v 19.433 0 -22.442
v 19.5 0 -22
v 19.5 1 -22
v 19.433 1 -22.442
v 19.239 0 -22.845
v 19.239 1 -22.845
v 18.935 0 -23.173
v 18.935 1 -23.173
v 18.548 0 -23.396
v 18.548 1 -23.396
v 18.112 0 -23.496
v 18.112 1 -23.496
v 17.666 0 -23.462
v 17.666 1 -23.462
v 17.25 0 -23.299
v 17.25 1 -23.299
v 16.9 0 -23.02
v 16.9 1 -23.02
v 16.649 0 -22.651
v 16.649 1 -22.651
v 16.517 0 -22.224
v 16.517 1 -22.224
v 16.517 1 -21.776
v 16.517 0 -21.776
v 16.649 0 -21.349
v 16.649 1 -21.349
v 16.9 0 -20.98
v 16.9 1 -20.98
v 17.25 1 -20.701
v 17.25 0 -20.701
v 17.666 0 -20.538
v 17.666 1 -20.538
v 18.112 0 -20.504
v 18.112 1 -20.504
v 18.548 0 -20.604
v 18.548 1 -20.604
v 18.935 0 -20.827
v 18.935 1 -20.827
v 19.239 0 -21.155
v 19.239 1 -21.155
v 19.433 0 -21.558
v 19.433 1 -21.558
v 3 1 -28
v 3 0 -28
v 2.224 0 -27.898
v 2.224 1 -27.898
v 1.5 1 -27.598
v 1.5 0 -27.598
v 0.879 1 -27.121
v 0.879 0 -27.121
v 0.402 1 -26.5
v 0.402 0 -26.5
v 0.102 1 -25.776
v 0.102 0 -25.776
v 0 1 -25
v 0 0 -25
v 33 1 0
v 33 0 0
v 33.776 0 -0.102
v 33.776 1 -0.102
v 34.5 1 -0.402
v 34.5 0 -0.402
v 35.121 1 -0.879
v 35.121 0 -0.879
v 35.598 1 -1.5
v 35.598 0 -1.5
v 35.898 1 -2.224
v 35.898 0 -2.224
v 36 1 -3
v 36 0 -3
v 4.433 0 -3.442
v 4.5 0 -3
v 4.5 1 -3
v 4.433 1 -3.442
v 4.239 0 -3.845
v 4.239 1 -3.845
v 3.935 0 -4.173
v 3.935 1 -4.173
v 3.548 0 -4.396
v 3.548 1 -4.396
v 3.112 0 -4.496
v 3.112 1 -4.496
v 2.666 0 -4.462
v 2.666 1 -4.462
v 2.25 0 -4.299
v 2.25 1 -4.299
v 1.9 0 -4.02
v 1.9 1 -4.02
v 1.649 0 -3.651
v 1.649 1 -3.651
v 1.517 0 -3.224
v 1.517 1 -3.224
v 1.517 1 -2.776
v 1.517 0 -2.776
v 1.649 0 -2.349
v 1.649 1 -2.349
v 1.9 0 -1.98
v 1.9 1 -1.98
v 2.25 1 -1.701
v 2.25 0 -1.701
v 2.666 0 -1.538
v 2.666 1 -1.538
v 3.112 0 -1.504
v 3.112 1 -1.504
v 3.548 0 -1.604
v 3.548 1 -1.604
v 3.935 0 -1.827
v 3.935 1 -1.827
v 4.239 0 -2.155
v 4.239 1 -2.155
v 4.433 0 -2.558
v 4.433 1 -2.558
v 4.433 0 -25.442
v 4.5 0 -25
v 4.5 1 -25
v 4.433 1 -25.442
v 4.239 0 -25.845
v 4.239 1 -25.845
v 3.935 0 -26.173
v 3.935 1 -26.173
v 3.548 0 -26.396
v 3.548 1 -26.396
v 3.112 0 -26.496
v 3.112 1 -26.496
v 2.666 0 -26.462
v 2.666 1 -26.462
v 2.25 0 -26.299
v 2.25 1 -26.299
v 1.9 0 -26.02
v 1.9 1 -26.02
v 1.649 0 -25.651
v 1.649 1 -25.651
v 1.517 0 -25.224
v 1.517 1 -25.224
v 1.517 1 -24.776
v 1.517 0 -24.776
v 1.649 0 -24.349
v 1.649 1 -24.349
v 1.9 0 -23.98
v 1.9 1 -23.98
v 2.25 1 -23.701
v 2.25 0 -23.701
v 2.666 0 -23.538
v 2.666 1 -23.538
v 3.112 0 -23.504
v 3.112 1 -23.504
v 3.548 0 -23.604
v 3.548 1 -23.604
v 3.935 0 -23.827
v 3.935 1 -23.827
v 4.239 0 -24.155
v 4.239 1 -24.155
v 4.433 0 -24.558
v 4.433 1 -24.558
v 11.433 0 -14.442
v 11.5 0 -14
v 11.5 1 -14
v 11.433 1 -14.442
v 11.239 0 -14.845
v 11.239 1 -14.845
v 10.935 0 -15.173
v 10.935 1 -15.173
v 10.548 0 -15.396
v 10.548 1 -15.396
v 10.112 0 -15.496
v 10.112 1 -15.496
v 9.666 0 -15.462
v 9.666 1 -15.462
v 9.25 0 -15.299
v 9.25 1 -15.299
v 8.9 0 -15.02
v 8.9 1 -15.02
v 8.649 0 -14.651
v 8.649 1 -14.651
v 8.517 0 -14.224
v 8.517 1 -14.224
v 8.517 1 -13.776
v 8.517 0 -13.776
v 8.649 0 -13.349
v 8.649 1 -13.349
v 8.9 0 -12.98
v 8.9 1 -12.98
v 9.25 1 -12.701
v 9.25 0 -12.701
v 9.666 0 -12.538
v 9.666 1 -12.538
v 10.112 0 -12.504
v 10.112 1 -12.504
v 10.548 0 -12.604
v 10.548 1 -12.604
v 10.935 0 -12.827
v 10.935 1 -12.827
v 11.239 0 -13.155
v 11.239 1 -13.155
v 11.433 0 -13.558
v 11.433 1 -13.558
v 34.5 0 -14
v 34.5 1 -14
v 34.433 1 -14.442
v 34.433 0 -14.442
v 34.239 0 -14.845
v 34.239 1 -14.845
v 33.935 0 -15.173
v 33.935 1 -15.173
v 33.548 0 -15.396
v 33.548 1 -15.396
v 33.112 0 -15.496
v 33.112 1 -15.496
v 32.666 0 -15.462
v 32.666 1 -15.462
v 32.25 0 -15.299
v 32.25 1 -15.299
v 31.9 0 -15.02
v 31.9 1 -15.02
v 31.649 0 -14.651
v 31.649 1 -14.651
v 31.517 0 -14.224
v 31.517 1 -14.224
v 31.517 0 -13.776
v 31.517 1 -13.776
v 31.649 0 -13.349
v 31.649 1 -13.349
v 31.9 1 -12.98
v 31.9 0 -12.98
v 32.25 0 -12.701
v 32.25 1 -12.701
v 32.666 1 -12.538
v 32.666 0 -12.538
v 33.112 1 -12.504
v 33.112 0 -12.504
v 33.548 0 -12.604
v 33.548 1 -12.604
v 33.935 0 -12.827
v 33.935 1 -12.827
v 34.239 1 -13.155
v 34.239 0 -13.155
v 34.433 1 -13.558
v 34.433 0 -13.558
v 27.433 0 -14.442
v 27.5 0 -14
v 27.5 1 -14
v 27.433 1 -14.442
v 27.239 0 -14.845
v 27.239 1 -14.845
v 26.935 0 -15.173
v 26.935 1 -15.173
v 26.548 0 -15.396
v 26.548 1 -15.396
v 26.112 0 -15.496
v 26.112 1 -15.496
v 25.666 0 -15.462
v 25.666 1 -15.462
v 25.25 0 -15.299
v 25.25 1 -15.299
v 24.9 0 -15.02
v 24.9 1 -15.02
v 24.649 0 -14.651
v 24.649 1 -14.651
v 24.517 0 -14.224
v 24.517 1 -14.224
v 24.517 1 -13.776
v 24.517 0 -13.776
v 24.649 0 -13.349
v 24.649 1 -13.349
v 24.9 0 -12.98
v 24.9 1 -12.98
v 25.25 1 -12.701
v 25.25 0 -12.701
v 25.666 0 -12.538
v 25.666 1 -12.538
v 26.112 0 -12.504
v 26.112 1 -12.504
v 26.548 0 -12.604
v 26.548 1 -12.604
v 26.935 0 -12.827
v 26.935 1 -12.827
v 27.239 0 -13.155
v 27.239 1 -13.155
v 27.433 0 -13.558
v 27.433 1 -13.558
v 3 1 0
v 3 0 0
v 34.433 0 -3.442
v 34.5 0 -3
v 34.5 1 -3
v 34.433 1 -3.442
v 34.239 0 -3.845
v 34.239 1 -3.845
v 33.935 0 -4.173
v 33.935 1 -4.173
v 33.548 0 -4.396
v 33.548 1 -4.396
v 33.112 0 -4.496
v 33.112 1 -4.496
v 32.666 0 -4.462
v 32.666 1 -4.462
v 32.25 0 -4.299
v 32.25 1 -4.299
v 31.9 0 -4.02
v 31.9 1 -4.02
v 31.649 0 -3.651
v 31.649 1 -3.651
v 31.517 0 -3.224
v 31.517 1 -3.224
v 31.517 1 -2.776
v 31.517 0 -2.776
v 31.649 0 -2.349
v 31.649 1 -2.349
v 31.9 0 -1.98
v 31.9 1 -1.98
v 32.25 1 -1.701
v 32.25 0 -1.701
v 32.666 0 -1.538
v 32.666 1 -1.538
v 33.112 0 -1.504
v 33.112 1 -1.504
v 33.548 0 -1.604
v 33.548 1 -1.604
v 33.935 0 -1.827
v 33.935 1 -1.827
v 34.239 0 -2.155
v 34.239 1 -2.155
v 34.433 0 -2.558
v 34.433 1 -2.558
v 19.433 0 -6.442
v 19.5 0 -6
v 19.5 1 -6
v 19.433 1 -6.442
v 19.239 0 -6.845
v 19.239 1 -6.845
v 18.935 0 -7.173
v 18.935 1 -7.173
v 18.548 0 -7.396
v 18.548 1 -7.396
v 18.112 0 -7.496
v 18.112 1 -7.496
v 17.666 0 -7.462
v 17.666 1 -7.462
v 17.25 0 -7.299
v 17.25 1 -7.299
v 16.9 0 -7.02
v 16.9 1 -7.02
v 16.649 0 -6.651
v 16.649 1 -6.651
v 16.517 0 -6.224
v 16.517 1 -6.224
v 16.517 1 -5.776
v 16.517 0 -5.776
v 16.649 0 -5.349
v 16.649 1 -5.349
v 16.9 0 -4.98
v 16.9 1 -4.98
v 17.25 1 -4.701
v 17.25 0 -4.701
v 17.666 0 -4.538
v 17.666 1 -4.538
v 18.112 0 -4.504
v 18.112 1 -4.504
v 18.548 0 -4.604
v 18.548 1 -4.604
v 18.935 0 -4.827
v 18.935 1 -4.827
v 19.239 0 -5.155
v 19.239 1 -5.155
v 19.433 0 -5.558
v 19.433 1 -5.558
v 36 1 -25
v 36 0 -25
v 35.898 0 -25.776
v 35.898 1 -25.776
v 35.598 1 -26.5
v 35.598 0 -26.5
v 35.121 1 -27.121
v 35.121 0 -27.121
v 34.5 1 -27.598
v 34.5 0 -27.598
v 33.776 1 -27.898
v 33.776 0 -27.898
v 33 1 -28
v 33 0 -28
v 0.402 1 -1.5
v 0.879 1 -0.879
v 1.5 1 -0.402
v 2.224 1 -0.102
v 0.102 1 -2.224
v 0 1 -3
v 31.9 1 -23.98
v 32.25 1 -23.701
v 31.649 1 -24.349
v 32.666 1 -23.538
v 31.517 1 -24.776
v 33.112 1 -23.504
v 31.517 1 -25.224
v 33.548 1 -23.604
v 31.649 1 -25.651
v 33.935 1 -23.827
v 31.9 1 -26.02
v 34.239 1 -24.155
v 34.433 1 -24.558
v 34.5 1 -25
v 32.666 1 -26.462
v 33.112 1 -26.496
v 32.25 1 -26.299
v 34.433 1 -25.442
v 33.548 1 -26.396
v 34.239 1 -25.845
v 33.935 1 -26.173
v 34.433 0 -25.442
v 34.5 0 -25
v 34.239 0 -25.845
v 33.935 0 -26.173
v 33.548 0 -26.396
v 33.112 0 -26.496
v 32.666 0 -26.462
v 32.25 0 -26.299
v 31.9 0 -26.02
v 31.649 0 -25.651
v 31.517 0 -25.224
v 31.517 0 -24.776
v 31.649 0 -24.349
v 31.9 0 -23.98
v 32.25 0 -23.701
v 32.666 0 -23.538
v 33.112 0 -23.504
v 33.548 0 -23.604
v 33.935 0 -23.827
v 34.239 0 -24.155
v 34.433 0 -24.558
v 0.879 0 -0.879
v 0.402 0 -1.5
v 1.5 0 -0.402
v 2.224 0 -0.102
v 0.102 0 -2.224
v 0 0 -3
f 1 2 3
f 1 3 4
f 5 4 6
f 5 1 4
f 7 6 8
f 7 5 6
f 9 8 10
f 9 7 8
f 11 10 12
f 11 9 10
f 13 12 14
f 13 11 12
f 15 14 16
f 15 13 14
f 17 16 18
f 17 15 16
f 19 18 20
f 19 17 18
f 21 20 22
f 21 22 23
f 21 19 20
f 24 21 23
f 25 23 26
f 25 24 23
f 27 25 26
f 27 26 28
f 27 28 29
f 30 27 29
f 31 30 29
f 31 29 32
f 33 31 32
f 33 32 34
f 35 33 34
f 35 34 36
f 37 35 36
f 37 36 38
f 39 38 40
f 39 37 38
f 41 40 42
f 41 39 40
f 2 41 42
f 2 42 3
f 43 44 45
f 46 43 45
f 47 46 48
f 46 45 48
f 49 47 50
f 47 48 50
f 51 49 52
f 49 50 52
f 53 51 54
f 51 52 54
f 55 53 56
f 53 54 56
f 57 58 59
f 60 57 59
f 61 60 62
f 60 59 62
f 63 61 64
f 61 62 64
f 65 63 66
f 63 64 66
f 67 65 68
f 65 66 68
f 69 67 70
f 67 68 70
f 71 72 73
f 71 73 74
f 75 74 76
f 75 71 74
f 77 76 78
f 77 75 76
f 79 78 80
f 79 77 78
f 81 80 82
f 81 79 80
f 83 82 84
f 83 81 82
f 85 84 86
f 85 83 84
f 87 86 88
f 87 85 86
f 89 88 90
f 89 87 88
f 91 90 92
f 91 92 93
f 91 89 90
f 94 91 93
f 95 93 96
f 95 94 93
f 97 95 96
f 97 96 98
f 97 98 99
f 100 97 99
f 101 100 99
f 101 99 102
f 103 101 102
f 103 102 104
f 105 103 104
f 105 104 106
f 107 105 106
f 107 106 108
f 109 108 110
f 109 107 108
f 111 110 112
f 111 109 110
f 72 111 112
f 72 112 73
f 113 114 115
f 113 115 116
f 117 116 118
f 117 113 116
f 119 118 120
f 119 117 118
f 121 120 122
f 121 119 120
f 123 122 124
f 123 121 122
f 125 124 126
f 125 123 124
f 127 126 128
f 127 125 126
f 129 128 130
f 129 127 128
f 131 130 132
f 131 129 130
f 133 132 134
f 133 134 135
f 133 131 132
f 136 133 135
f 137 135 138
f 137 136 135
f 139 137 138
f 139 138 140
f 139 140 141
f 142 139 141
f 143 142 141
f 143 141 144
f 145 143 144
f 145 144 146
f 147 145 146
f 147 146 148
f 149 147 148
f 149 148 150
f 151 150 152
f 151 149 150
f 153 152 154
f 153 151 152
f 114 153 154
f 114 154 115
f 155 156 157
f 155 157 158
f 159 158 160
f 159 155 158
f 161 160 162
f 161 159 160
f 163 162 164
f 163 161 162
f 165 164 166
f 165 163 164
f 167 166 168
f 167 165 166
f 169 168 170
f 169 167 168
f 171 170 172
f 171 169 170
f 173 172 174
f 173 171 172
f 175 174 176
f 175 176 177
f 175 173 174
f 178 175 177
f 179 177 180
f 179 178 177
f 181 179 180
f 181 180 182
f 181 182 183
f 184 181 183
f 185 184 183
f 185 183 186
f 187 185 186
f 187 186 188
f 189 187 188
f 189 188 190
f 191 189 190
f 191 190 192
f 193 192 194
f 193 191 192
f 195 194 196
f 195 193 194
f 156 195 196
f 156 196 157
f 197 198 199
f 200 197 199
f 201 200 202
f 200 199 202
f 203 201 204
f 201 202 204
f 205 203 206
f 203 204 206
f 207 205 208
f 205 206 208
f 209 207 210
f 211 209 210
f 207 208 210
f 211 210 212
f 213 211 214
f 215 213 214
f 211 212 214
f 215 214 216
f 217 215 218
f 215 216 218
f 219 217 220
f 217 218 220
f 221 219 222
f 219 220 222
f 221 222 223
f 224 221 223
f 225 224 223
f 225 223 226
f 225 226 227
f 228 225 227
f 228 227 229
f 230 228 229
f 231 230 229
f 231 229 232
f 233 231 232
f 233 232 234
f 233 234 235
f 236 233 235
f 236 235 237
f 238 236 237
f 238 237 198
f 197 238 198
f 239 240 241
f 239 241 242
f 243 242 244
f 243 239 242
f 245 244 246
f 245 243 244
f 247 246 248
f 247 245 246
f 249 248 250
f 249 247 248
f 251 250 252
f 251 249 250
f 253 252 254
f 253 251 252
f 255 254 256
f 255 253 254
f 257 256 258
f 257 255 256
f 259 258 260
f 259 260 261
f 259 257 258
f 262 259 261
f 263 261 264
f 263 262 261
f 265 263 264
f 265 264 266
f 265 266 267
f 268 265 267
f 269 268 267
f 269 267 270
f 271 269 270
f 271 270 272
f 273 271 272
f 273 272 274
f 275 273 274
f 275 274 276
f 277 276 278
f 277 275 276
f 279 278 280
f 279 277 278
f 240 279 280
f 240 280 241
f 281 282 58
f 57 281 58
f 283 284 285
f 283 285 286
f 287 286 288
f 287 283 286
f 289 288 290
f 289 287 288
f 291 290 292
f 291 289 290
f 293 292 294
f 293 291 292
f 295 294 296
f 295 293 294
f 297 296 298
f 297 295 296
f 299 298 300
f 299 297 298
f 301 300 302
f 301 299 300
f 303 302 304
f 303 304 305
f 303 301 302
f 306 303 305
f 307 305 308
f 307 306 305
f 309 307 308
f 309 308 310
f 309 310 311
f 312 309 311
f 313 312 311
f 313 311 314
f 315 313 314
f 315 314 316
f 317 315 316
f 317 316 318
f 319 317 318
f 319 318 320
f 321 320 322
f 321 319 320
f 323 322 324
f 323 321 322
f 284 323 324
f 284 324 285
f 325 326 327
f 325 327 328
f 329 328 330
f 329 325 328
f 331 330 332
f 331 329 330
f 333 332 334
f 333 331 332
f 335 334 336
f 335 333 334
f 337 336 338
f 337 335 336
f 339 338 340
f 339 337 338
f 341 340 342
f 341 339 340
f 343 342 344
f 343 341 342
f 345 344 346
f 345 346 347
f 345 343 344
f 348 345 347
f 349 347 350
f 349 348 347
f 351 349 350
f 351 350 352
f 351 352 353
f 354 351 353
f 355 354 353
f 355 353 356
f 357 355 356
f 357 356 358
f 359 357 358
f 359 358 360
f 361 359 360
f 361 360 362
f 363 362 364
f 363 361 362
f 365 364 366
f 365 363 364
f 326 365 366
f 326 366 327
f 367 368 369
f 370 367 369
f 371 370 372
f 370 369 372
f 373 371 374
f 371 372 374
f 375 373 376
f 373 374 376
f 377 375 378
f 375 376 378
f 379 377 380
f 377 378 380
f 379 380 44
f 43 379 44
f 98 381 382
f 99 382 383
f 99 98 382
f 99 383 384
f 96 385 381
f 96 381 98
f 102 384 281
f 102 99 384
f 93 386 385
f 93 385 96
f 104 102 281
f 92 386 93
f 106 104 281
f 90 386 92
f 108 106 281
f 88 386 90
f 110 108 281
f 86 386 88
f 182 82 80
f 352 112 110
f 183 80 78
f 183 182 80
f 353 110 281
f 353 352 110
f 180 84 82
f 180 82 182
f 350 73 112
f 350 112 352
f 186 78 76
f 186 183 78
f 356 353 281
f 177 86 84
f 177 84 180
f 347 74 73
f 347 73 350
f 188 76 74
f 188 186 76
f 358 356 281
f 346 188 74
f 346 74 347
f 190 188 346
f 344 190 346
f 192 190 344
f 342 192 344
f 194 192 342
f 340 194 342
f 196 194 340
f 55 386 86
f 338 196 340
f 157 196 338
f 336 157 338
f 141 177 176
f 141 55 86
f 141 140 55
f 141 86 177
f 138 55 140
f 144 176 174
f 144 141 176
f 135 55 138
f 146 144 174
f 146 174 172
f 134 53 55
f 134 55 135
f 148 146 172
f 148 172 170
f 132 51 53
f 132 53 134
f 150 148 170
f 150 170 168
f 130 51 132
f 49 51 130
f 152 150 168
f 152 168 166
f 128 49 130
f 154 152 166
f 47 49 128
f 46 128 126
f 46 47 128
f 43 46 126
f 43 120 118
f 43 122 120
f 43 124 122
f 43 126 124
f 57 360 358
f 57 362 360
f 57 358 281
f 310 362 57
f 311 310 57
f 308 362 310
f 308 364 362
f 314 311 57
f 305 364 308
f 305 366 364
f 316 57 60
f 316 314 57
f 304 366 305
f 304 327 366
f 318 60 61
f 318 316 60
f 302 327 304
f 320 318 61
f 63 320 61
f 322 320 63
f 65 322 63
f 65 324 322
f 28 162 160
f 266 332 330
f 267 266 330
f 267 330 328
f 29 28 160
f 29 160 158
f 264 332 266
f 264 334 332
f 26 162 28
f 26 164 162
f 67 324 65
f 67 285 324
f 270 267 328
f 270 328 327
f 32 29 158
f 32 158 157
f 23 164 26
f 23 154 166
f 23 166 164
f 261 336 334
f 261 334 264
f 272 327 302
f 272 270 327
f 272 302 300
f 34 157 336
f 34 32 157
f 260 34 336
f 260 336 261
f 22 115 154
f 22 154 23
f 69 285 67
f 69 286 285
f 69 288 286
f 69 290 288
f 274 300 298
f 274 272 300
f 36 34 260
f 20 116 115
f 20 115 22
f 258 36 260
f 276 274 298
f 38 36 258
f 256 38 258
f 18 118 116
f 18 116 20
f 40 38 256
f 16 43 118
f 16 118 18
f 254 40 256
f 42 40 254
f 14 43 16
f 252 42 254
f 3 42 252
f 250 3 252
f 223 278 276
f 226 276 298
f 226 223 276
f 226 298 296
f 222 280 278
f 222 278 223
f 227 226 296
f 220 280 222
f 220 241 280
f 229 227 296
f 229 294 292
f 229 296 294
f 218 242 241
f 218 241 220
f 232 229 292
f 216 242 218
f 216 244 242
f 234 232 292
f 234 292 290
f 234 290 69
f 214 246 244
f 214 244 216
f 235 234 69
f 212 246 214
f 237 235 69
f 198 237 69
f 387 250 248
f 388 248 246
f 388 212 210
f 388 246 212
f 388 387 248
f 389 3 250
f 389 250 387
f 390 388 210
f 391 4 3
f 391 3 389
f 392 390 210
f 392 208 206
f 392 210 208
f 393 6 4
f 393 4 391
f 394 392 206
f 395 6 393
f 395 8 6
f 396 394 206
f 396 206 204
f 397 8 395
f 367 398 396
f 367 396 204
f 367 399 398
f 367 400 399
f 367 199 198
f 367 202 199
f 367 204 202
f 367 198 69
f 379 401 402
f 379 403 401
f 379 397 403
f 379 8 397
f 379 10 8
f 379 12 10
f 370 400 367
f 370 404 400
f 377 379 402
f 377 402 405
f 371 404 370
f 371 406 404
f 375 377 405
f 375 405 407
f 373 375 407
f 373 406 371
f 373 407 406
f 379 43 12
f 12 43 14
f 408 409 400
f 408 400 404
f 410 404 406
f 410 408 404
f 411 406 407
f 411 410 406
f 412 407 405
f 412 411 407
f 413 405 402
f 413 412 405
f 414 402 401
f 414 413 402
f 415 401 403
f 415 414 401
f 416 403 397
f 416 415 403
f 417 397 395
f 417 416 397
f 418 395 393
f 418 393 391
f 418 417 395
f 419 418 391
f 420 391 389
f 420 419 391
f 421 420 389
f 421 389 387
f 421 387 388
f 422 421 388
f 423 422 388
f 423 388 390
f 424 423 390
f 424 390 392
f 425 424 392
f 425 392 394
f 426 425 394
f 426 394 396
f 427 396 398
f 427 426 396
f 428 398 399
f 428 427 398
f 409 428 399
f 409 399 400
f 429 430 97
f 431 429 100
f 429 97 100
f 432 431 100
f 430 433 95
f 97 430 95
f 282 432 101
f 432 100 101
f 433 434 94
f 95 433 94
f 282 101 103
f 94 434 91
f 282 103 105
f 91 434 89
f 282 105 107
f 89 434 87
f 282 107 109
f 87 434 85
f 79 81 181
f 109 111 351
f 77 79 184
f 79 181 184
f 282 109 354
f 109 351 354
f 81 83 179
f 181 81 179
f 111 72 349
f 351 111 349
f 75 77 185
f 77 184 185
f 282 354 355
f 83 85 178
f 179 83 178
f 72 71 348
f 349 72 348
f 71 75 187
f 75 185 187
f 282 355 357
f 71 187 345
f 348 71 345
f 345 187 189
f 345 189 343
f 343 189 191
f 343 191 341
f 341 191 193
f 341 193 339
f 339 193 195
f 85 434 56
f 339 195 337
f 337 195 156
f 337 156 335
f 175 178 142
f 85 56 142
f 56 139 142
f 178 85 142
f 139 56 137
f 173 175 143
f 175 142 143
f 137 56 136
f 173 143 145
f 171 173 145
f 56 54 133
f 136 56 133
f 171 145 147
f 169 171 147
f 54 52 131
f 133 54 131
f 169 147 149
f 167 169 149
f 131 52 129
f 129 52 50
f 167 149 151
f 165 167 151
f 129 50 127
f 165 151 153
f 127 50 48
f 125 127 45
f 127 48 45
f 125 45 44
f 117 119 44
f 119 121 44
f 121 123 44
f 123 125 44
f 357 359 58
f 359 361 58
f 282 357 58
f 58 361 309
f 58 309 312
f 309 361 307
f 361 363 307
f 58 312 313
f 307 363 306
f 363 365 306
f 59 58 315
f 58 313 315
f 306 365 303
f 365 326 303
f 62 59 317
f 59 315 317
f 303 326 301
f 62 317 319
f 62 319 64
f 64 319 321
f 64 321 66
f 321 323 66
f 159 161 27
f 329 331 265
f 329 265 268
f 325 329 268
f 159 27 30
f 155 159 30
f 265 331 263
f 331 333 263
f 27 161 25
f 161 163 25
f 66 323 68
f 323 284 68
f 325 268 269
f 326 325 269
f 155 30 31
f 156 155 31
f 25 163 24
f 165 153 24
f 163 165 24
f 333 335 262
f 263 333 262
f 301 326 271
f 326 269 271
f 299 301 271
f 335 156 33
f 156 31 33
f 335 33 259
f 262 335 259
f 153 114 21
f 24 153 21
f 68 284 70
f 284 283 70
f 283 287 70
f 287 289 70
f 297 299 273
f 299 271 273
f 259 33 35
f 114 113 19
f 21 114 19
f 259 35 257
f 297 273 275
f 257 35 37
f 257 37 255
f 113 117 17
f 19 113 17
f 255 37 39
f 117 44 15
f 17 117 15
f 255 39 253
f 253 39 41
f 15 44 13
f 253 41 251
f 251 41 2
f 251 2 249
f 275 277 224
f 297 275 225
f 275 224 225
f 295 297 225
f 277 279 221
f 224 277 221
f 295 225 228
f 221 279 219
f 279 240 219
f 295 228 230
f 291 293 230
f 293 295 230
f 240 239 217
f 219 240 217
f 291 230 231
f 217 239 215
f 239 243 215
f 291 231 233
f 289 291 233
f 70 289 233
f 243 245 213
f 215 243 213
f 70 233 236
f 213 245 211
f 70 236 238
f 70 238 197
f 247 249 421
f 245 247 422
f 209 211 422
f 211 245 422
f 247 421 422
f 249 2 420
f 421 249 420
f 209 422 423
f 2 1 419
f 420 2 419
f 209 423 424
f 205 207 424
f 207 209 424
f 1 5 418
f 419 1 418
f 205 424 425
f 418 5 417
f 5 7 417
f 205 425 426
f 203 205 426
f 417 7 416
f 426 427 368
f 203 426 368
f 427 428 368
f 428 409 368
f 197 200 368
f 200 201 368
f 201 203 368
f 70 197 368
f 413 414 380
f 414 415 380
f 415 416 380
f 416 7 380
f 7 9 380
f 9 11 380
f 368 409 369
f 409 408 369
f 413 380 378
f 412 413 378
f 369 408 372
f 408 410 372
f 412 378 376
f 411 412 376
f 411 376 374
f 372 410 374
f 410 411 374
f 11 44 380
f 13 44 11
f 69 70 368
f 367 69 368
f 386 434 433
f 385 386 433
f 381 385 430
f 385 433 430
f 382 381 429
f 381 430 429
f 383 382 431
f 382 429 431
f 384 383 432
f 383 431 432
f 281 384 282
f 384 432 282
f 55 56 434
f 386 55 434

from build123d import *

# Parameters (mm, degrees)
SKETCH1_R           = 1.5
BOSS_EXTRUDE1_DEPTH = 1
SKETCH2_R           = 1.5
CUT_EXTRUDE1_DEPTH  = 10


with BuildPart() as part:
    # Sketch1 → Boss-Extrude1 (new body)
    with BuildSketch(Plane(origin=(0, 0, 0), x_dir=(1, 0, 0), z_dir=(0, 1, 0))):
        with BuildLine():
            Line((3, 0), (33, 0))
            ThreePointArc((33, 0), (35.121320344, 0.878679656), (36, 3))
            Line((36, 3), (36, 25))
            ThreePointArc((36, 25), (35.121320344, 27.121320344), (33, 28))
            Line((33, 28), (3, 28))
            ThreePointArc((3, 28), (0.878679656, 27.121320344), (0, 25))
            Line((0, 25), (0, 3))
            ThreePointArc((0, 3), (0.878679656, 0.878679656), (3, 0))
        make_face()
        with Locations((3, 25)):
            Circle(SKETCH1_R, mode=Mode.SUBTRACT)
        with Locations((3, 3)):
            Circle(SKETCH1_R, mode=Mode.SUBTRACT)
        with Locations((33, 25)):
            Circle(SKETCH1_R, mode=Mode.SUBTRACT)
        with Locations((33, 3)):
            Circle(SKETCH1_R, mode=Mode.SUBTRACT)
        with Locations((18, 22)):
            Circle(SKETCH1_R, mode=Mode.SUBTRACT)
        with Locations((18, 6)):
            Circle(SKETCH1_R, mode=Mode.SUBTRACT)
        with Locations((26, 14)):
            Circle(SKETCH1_R, mode=Mode.SUBTRACT)
        with Locations((10, 14)):
            Circle(SKETCH1_R, mode=Mode.SUBTRACT)
    extrude(amount=BOSS_EXTRUDE1_DEPTH)

    # Sketch2 → Cut-Extrude1 (cut)
    with BuildSketch(Plane(origin=(0, 1, 0), x_dir=(1, 0, 0), z_dir=(0, 1, 0))):
        with Locations((33, 14)):
            Circle(SKETCH2_R)
    extrude(amount=-CUT_EXTRUDE1_DEPTH, mode=Mode.SUBTRACT)


solid = part.part
